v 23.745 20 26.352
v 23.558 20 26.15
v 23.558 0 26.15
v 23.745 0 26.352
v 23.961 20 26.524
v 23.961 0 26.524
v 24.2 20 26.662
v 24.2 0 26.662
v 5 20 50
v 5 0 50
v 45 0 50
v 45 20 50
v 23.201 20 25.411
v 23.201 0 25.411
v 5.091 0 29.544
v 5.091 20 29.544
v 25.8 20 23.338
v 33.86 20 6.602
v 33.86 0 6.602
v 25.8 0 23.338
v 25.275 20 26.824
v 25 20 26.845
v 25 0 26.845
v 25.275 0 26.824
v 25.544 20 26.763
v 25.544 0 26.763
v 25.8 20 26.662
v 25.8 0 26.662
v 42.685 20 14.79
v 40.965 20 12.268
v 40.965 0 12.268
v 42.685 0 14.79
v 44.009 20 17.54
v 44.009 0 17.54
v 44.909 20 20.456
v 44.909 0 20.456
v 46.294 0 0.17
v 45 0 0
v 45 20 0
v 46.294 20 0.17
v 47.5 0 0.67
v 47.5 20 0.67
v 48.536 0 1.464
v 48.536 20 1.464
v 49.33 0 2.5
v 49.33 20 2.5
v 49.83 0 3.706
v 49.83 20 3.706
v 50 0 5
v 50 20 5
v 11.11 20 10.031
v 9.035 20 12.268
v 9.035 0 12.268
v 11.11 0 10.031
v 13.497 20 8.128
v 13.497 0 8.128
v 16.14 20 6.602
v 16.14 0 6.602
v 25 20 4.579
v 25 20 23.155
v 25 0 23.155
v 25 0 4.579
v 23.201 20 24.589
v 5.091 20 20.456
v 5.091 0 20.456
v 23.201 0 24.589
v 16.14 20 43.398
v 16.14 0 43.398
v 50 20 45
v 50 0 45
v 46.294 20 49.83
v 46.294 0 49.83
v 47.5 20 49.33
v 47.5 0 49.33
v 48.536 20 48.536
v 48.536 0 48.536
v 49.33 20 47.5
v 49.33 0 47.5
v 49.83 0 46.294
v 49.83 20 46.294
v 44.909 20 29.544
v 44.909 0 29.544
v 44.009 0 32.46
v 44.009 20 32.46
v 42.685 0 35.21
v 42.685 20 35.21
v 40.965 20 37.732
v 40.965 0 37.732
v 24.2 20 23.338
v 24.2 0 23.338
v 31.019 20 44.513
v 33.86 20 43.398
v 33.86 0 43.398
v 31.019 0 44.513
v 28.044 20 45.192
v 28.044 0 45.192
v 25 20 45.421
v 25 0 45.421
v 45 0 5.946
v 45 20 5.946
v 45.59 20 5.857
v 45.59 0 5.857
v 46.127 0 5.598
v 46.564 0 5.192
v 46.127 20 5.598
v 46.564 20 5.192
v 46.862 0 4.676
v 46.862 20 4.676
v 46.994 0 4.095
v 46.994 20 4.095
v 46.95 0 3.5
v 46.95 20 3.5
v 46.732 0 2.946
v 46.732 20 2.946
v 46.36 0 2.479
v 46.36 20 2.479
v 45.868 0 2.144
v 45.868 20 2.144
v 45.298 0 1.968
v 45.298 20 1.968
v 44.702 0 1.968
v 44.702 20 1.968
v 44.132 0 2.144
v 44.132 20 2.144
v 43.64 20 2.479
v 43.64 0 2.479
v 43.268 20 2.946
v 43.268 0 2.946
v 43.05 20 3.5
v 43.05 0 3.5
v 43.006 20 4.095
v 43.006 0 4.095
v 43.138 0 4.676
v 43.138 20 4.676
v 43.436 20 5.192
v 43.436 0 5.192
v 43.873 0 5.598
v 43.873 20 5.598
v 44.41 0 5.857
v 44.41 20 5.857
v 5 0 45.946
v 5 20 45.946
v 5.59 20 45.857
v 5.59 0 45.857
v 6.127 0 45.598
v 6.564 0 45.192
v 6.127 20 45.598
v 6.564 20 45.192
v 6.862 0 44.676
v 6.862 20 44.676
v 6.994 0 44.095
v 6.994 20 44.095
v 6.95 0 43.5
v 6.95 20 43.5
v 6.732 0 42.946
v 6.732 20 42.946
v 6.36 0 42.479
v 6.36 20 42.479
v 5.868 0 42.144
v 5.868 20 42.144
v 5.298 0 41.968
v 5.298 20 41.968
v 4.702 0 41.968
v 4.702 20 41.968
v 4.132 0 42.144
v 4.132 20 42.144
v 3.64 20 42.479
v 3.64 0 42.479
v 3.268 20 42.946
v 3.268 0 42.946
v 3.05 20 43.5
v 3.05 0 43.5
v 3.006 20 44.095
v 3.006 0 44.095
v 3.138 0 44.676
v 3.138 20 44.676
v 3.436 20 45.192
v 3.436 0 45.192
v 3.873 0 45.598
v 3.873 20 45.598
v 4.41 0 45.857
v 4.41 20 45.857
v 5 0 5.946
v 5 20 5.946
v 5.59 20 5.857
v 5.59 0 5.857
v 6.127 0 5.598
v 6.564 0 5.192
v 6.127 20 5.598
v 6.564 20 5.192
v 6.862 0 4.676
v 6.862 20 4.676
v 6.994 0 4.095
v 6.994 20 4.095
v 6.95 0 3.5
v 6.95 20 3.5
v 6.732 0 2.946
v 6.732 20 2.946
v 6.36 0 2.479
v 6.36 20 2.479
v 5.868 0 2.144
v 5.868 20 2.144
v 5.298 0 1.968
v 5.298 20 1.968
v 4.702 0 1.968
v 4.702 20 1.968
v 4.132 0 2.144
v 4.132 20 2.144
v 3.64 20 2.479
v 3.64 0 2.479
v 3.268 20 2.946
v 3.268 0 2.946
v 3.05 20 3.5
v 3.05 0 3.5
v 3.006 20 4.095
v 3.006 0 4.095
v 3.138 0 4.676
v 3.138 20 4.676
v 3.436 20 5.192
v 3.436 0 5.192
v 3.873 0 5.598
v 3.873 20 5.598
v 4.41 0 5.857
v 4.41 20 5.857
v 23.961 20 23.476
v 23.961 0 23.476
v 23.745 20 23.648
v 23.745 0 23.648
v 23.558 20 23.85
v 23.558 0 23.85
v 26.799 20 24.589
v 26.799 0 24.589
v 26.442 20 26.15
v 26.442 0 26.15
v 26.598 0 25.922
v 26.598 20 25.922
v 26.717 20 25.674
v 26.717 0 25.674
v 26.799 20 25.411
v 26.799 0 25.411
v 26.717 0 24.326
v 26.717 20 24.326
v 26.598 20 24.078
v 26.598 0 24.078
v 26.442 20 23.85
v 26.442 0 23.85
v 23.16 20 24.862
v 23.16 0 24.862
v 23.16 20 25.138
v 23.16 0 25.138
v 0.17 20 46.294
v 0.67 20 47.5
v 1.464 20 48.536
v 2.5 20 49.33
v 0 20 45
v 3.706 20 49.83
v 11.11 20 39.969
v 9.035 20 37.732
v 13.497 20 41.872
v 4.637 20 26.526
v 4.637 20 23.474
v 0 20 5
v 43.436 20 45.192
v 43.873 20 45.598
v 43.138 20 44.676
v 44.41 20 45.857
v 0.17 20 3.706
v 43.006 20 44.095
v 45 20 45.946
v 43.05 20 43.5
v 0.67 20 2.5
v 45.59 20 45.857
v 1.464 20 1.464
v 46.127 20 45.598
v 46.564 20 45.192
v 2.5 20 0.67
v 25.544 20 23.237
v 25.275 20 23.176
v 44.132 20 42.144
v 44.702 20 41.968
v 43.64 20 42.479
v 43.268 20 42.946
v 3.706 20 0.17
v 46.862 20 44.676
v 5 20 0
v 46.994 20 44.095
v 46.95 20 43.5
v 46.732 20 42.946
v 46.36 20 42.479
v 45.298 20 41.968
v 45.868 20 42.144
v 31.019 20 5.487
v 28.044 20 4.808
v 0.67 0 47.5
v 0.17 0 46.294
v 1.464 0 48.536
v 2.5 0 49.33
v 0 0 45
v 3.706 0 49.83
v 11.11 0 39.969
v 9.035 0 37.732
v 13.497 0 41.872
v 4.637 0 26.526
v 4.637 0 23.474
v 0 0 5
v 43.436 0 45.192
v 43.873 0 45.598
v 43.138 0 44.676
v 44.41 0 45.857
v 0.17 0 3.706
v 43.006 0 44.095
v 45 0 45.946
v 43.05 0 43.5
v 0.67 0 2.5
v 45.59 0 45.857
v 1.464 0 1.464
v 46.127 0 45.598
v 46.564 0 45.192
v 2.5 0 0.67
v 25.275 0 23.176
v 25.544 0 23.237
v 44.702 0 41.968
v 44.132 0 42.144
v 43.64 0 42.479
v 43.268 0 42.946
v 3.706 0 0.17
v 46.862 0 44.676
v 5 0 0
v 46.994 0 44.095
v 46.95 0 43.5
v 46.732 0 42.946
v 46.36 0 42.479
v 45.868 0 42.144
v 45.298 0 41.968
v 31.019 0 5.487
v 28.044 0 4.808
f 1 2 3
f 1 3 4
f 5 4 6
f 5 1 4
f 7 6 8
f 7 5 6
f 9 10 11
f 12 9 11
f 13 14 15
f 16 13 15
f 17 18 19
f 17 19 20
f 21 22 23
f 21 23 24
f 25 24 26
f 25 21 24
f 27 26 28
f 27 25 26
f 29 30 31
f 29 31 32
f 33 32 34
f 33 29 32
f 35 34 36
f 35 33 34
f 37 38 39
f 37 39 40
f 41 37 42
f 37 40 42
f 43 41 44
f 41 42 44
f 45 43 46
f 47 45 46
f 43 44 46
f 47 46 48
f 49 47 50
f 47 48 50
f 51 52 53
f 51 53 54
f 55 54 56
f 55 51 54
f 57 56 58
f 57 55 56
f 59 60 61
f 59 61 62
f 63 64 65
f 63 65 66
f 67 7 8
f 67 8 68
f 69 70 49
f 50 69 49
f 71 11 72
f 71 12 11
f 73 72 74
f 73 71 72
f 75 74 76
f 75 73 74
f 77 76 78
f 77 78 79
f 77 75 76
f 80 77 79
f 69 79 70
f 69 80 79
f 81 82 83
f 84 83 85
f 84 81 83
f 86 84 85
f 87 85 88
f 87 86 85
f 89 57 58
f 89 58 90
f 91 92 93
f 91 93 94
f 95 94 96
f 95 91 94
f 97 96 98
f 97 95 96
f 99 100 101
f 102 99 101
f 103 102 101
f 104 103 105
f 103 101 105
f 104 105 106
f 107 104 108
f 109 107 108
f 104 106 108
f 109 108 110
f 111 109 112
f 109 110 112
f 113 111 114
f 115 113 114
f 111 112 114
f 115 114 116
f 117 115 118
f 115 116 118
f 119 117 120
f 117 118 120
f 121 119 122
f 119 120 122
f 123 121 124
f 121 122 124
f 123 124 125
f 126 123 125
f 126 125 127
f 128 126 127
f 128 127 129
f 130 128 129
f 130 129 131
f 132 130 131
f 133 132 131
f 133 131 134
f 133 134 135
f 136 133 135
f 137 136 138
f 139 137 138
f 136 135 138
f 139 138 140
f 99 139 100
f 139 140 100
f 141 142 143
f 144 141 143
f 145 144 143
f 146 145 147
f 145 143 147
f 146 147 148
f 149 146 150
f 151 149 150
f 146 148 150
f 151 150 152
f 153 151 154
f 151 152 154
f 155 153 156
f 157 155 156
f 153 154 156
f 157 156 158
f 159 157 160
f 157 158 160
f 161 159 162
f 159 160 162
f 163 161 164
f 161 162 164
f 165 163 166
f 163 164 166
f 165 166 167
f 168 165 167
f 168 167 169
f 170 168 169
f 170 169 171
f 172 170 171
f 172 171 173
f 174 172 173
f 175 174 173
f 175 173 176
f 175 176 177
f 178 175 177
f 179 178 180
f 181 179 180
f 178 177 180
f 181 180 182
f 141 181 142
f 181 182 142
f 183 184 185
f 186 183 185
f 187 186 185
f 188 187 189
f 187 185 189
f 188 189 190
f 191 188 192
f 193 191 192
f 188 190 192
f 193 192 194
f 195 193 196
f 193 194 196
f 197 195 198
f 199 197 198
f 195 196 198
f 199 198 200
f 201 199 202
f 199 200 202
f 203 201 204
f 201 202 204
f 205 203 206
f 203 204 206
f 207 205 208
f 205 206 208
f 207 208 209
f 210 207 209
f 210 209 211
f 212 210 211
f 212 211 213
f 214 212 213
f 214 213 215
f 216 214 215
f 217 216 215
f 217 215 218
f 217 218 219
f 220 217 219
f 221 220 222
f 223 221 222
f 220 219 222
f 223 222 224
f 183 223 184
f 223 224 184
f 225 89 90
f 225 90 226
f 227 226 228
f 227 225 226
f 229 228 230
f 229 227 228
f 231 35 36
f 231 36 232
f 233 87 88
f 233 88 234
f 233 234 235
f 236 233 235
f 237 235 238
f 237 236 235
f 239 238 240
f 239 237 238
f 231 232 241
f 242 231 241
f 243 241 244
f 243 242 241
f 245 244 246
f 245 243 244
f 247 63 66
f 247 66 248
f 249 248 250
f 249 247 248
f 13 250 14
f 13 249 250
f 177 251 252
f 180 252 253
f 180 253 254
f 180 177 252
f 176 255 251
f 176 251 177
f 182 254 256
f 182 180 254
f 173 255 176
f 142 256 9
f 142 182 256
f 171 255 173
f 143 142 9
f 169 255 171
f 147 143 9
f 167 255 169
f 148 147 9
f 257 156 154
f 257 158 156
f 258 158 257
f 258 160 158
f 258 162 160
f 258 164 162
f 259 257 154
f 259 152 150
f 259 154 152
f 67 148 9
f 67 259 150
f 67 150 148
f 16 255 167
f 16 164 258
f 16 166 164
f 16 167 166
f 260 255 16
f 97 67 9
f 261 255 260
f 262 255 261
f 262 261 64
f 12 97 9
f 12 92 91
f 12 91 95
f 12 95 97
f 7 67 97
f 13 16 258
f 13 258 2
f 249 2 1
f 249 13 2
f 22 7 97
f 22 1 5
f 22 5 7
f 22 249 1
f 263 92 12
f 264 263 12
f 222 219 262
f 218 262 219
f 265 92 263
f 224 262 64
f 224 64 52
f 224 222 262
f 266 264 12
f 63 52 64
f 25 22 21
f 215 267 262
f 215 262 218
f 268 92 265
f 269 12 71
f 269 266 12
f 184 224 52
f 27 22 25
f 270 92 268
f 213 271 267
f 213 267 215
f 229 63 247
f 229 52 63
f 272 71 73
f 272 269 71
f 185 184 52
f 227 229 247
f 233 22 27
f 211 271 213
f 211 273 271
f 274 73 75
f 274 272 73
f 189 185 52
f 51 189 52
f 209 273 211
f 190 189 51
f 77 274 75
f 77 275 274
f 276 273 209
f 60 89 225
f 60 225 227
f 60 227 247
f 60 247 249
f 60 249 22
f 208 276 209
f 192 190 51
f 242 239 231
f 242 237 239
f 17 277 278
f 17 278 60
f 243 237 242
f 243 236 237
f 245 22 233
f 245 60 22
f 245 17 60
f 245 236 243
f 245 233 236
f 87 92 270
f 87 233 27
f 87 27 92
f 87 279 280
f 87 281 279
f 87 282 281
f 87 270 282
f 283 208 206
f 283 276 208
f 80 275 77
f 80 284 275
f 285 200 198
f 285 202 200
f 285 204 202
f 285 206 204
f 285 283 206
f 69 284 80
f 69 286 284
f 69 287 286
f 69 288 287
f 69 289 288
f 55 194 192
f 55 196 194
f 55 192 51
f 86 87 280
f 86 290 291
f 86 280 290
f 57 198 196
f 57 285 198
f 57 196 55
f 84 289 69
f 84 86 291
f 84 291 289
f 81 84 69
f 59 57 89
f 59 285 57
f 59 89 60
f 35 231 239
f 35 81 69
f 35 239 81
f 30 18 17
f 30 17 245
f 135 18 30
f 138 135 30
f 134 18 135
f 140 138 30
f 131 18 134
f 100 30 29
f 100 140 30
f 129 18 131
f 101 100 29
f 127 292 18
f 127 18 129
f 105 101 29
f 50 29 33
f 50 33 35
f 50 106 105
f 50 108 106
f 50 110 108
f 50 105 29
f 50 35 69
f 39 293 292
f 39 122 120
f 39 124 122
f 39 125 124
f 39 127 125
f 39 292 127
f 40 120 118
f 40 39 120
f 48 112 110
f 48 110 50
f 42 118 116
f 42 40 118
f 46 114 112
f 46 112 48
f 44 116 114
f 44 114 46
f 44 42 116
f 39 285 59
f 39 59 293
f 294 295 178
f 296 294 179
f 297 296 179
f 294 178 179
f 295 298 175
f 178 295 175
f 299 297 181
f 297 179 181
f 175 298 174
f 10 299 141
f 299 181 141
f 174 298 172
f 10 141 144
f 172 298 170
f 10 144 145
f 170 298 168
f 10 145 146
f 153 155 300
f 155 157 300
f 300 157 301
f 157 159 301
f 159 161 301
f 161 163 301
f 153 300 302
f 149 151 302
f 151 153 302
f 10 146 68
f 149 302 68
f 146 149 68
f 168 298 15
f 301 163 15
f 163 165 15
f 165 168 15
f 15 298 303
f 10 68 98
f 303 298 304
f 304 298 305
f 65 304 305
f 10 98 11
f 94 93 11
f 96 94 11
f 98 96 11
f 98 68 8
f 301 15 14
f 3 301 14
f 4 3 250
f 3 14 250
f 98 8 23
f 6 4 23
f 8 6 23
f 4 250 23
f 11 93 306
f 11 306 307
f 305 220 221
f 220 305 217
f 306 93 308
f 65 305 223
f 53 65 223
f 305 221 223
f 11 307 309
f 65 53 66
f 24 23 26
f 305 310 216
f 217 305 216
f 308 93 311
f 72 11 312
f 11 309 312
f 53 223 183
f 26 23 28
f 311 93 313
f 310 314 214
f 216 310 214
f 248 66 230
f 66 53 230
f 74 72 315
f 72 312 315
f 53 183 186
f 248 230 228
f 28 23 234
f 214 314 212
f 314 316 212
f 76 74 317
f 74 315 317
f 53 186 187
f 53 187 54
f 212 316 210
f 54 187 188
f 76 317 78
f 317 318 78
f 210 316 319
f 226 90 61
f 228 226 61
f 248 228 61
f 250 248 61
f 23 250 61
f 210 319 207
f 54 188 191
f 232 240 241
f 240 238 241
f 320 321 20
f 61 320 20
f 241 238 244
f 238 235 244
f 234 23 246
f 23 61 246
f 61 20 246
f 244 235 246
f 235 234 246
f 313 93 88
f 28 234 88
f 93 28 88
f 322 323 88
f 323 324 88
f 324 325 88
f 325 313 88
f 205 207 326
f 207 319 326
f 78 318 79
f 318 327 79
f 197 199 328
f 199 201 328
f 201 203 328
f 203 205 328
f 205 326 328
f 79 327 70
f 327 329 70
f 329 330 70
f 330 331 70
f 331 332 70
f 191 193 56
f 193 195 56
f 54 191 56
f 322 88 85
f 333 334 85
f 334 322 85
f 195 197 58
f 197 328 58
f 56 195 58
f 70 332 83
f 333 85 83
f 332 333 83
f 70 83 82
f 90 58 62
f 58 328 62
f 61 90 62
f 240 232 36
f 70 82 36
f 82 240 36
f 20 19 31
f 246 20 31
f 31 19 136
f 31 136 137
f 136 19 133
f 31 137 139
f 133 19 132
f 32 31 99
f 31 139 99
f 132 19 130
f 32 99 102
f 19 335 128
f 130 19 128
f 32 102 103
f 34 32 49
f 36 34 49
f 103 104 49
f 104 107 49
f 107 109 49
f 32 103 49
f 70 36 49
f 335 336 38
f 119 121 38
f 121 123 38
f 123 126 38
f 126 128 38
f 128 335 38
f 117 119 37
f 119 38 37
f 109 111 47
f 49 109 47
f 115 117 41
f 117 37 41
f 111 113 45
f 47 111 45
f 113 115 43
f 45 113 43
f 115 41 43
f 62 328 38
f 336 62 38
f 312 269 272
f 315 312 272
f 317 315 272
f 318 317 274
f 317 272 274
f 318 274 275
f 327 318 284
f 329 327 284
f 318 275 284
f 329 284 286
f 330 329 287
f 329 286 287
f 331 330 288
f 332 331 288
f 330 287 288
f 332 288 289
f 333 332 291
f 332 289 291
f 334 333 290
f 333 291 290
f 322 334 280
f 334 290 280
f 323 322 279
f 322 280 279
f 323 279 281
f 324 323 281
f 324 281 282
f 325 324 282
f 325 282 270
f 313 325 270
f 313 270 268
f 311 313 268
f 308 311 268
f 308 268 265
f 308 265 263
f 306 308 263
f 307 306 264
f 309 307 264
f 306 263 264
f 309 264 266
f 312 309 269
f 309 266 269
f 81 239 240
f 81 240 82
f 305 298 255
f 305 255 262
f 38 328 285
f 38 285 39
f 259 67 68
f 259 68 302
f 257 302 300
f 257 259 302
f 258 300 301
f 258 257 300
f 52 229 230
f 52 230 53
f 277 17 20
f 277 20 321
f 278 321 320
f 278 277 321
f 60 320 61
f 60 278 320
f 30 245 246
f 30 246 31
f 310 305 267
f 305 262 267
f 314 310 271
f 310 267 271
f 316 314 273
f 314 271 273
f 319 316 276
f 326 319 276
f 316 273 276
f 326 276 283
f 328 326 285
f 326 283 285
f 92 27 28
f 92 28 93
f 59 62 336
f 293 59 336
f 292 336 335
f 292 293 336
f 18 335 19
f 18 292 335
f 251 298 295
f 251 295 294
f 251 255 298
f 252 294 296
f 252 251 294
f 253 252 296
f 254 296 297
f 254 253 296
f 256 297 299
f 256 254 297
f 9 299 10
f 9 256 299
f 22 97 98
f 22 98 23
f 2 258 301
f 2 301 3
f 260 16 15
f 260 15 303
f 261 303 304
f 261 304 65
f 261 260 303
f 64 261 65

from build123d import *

# Parameters (mm, degrees)
SKETCH_1_W          = 50
SKETCH_1_H          = 50
EXTRUDE_1_DEPTH     = 20
SKETCH_2_R          = 2
CUT_EXTRUDE_1_DEPTH = 20
CUT_EXTRUDE_2_DEPTH = 20
FILLET_1_R          = 5


with BuildPart() as part:
    # 草图1 → 凸台-拉伸1 (new body)
    with BuildSketch(Plane(origin=(0, 0, 0), x_dir=(1, 0, 0), z_dir=(0, 1, 0))):
        with Locations((25, -25)):
            Rectangle(SKETCH_1_W, SKETCH_1_H)
    extrude(amount=EXTRUDE_1_DEPTH)

    # 草图2 → 切除-拉伸1 (cut)
    with BuildSketch(Plane(origin=(0, 20, 0), x_dir=(1, 0, 0), z_dir=(0, 1, 0))):
        with Locations(Location((5, -3.945505115, 0), (0, 0, 270))):
            Circle(SKETCH_2_R)
        with Locations(Location((45, -3.945505115, 0), (0, 0, 270))):
            Circle(SKETCH_2_R)
        with Locations(Location((5, -43.945505115, 0), (0, 0, 270))):
            Circle(SKETCH_2_R)
        with Locations(Location((45, -43.945505115, 0), (0, 0, 270))):
            Circle(SKETCH_2_R)
    extrude(amount=-CUT_EXTRUDE_1_DEPTH, mode=Mode.SUBTRACT)

    # 草图3 → 切除-拉伸2 (cut)
    with BuildSketch(Plane(origin=(0, 20, 0), x_dir=(1, 0, 0), z_dir=(0, 1, 0))):
        with BuildLine():
            Line((25, -23.155221491), (25, -4.579448382))
            ThreePointArc((25, -4.579448382), (29.544000218, -5.091434245), (33.860145291, -6.601718727))
            Line((33.860145291, -6.601718727), (25.800419398, -23.337911995))
            ThreePointArc((25.800419398, -23.337911995), (25.410501837, -23.201473939), (25, -23.155221491))
        make_face()
        with BuildLine():
            Line((26.442305917, -23.849799413), (40.965430144, -12.267994318))
            ThreePointArc((40.965430144, -12.267994318), (43.398281273, -16.139854709), (44.908565755, -20.455999782))
            Line((44.908565755, -20.455999782), (26.798526061, -24.589498163))
            ThreePointArc((26.798526061, -24.589498163), (26.662088005, -24.199580602), (26.442305917, -23.849799413))
        make_face()
        with BuildLine():
            Line((26.798526061, -25.410501837), (44.908565755, -29.544000218))
            ThreePointArc((44.908565755, -29.544000218), (43.398281273, -33.860145291), (40.965430144, -37.732005682))
            Line((40.965430144, -37.732005682), (26.442305917, -26.150200587))
            ThreePointArc((26.442305917, -26.150200587), (26.662088005, -25.800419398), (26.798526061, -25.410501837))
        make_face()
        with BuildLine():
            Line((25.800419398, -26.662088005), (33.860145291, -43.398281273))
            ThreePointArc((33.860145291, -43.398281273), (29.544000218, -44.908565755), (25, -45.420551618))
            Line((25, -45.420551618), (25, -26.844778509))
            ThreePointArc((25, -26.844778509), (25.410501837, -26.798526061), (25.800419398, -26.662088005))
        make_face()
        with BuildLine():
            Line((24.199580602, -26.662088005), (16.139854709, -43.398281273))
            ThreePointArc((16.139854709, -43.398281273), (12.267994318, -40.965430144), (9.034569856, -37.732005682))
            Line((9.034569856, -37.732005682), (23.557694083, -26.150200587))
            ThreePointArc((23.557694083, -26.150200587), (23.849799413, -26.442305917), (24.199580602, -26.662088005))
        make_face()
        with BuildLine():
            Line((23.201473939, -25.410501837), (5.091434245, -29.544000218))
            ThreePointArc((5.091434245, -29.544000218), (4.579448382, -25), (5.091434245, -20.455999782))
            Line((5.091434245, -20.455999782), (23.201473939, -24.589498163))
            ThreePointArc((23.201473939, -24.589498163), (23.155221491, -25), (23.201473939, -25.410501837))
        make_face()
        with BuildLine():
            Line((23.557694083, -23.849799413), (9.034569856, -12.267994318))
            ThreePointArc((9.034569856, -12.267994318), (12.267994318, -9.034569856), (16.139854709, -6.601718727))
            Line((16.139854709, -6.601718727), (24.199580602, -23.337911995))
            ThreePointArc((24.199580602, -23.337911995), (23.849799413, -23.557694083), (23.557694083, -23.849799413))
        make_face()
    extrude(amount=-CUT_EXTRUDE_2_DEPTH, mode=Mode.SUBTRACT)

    # 圆角1
    fillet_1_edges = [part.edges().sort_by_distance(p)[0] for p in [
        (0, 10, 0),
        (50, 10, 0),
        (50, 10, 50),
        (0, 10, 50),
    ]]
    fillet(fillet_1_edges, radius=FILLET_1_R)


solid = part.part
